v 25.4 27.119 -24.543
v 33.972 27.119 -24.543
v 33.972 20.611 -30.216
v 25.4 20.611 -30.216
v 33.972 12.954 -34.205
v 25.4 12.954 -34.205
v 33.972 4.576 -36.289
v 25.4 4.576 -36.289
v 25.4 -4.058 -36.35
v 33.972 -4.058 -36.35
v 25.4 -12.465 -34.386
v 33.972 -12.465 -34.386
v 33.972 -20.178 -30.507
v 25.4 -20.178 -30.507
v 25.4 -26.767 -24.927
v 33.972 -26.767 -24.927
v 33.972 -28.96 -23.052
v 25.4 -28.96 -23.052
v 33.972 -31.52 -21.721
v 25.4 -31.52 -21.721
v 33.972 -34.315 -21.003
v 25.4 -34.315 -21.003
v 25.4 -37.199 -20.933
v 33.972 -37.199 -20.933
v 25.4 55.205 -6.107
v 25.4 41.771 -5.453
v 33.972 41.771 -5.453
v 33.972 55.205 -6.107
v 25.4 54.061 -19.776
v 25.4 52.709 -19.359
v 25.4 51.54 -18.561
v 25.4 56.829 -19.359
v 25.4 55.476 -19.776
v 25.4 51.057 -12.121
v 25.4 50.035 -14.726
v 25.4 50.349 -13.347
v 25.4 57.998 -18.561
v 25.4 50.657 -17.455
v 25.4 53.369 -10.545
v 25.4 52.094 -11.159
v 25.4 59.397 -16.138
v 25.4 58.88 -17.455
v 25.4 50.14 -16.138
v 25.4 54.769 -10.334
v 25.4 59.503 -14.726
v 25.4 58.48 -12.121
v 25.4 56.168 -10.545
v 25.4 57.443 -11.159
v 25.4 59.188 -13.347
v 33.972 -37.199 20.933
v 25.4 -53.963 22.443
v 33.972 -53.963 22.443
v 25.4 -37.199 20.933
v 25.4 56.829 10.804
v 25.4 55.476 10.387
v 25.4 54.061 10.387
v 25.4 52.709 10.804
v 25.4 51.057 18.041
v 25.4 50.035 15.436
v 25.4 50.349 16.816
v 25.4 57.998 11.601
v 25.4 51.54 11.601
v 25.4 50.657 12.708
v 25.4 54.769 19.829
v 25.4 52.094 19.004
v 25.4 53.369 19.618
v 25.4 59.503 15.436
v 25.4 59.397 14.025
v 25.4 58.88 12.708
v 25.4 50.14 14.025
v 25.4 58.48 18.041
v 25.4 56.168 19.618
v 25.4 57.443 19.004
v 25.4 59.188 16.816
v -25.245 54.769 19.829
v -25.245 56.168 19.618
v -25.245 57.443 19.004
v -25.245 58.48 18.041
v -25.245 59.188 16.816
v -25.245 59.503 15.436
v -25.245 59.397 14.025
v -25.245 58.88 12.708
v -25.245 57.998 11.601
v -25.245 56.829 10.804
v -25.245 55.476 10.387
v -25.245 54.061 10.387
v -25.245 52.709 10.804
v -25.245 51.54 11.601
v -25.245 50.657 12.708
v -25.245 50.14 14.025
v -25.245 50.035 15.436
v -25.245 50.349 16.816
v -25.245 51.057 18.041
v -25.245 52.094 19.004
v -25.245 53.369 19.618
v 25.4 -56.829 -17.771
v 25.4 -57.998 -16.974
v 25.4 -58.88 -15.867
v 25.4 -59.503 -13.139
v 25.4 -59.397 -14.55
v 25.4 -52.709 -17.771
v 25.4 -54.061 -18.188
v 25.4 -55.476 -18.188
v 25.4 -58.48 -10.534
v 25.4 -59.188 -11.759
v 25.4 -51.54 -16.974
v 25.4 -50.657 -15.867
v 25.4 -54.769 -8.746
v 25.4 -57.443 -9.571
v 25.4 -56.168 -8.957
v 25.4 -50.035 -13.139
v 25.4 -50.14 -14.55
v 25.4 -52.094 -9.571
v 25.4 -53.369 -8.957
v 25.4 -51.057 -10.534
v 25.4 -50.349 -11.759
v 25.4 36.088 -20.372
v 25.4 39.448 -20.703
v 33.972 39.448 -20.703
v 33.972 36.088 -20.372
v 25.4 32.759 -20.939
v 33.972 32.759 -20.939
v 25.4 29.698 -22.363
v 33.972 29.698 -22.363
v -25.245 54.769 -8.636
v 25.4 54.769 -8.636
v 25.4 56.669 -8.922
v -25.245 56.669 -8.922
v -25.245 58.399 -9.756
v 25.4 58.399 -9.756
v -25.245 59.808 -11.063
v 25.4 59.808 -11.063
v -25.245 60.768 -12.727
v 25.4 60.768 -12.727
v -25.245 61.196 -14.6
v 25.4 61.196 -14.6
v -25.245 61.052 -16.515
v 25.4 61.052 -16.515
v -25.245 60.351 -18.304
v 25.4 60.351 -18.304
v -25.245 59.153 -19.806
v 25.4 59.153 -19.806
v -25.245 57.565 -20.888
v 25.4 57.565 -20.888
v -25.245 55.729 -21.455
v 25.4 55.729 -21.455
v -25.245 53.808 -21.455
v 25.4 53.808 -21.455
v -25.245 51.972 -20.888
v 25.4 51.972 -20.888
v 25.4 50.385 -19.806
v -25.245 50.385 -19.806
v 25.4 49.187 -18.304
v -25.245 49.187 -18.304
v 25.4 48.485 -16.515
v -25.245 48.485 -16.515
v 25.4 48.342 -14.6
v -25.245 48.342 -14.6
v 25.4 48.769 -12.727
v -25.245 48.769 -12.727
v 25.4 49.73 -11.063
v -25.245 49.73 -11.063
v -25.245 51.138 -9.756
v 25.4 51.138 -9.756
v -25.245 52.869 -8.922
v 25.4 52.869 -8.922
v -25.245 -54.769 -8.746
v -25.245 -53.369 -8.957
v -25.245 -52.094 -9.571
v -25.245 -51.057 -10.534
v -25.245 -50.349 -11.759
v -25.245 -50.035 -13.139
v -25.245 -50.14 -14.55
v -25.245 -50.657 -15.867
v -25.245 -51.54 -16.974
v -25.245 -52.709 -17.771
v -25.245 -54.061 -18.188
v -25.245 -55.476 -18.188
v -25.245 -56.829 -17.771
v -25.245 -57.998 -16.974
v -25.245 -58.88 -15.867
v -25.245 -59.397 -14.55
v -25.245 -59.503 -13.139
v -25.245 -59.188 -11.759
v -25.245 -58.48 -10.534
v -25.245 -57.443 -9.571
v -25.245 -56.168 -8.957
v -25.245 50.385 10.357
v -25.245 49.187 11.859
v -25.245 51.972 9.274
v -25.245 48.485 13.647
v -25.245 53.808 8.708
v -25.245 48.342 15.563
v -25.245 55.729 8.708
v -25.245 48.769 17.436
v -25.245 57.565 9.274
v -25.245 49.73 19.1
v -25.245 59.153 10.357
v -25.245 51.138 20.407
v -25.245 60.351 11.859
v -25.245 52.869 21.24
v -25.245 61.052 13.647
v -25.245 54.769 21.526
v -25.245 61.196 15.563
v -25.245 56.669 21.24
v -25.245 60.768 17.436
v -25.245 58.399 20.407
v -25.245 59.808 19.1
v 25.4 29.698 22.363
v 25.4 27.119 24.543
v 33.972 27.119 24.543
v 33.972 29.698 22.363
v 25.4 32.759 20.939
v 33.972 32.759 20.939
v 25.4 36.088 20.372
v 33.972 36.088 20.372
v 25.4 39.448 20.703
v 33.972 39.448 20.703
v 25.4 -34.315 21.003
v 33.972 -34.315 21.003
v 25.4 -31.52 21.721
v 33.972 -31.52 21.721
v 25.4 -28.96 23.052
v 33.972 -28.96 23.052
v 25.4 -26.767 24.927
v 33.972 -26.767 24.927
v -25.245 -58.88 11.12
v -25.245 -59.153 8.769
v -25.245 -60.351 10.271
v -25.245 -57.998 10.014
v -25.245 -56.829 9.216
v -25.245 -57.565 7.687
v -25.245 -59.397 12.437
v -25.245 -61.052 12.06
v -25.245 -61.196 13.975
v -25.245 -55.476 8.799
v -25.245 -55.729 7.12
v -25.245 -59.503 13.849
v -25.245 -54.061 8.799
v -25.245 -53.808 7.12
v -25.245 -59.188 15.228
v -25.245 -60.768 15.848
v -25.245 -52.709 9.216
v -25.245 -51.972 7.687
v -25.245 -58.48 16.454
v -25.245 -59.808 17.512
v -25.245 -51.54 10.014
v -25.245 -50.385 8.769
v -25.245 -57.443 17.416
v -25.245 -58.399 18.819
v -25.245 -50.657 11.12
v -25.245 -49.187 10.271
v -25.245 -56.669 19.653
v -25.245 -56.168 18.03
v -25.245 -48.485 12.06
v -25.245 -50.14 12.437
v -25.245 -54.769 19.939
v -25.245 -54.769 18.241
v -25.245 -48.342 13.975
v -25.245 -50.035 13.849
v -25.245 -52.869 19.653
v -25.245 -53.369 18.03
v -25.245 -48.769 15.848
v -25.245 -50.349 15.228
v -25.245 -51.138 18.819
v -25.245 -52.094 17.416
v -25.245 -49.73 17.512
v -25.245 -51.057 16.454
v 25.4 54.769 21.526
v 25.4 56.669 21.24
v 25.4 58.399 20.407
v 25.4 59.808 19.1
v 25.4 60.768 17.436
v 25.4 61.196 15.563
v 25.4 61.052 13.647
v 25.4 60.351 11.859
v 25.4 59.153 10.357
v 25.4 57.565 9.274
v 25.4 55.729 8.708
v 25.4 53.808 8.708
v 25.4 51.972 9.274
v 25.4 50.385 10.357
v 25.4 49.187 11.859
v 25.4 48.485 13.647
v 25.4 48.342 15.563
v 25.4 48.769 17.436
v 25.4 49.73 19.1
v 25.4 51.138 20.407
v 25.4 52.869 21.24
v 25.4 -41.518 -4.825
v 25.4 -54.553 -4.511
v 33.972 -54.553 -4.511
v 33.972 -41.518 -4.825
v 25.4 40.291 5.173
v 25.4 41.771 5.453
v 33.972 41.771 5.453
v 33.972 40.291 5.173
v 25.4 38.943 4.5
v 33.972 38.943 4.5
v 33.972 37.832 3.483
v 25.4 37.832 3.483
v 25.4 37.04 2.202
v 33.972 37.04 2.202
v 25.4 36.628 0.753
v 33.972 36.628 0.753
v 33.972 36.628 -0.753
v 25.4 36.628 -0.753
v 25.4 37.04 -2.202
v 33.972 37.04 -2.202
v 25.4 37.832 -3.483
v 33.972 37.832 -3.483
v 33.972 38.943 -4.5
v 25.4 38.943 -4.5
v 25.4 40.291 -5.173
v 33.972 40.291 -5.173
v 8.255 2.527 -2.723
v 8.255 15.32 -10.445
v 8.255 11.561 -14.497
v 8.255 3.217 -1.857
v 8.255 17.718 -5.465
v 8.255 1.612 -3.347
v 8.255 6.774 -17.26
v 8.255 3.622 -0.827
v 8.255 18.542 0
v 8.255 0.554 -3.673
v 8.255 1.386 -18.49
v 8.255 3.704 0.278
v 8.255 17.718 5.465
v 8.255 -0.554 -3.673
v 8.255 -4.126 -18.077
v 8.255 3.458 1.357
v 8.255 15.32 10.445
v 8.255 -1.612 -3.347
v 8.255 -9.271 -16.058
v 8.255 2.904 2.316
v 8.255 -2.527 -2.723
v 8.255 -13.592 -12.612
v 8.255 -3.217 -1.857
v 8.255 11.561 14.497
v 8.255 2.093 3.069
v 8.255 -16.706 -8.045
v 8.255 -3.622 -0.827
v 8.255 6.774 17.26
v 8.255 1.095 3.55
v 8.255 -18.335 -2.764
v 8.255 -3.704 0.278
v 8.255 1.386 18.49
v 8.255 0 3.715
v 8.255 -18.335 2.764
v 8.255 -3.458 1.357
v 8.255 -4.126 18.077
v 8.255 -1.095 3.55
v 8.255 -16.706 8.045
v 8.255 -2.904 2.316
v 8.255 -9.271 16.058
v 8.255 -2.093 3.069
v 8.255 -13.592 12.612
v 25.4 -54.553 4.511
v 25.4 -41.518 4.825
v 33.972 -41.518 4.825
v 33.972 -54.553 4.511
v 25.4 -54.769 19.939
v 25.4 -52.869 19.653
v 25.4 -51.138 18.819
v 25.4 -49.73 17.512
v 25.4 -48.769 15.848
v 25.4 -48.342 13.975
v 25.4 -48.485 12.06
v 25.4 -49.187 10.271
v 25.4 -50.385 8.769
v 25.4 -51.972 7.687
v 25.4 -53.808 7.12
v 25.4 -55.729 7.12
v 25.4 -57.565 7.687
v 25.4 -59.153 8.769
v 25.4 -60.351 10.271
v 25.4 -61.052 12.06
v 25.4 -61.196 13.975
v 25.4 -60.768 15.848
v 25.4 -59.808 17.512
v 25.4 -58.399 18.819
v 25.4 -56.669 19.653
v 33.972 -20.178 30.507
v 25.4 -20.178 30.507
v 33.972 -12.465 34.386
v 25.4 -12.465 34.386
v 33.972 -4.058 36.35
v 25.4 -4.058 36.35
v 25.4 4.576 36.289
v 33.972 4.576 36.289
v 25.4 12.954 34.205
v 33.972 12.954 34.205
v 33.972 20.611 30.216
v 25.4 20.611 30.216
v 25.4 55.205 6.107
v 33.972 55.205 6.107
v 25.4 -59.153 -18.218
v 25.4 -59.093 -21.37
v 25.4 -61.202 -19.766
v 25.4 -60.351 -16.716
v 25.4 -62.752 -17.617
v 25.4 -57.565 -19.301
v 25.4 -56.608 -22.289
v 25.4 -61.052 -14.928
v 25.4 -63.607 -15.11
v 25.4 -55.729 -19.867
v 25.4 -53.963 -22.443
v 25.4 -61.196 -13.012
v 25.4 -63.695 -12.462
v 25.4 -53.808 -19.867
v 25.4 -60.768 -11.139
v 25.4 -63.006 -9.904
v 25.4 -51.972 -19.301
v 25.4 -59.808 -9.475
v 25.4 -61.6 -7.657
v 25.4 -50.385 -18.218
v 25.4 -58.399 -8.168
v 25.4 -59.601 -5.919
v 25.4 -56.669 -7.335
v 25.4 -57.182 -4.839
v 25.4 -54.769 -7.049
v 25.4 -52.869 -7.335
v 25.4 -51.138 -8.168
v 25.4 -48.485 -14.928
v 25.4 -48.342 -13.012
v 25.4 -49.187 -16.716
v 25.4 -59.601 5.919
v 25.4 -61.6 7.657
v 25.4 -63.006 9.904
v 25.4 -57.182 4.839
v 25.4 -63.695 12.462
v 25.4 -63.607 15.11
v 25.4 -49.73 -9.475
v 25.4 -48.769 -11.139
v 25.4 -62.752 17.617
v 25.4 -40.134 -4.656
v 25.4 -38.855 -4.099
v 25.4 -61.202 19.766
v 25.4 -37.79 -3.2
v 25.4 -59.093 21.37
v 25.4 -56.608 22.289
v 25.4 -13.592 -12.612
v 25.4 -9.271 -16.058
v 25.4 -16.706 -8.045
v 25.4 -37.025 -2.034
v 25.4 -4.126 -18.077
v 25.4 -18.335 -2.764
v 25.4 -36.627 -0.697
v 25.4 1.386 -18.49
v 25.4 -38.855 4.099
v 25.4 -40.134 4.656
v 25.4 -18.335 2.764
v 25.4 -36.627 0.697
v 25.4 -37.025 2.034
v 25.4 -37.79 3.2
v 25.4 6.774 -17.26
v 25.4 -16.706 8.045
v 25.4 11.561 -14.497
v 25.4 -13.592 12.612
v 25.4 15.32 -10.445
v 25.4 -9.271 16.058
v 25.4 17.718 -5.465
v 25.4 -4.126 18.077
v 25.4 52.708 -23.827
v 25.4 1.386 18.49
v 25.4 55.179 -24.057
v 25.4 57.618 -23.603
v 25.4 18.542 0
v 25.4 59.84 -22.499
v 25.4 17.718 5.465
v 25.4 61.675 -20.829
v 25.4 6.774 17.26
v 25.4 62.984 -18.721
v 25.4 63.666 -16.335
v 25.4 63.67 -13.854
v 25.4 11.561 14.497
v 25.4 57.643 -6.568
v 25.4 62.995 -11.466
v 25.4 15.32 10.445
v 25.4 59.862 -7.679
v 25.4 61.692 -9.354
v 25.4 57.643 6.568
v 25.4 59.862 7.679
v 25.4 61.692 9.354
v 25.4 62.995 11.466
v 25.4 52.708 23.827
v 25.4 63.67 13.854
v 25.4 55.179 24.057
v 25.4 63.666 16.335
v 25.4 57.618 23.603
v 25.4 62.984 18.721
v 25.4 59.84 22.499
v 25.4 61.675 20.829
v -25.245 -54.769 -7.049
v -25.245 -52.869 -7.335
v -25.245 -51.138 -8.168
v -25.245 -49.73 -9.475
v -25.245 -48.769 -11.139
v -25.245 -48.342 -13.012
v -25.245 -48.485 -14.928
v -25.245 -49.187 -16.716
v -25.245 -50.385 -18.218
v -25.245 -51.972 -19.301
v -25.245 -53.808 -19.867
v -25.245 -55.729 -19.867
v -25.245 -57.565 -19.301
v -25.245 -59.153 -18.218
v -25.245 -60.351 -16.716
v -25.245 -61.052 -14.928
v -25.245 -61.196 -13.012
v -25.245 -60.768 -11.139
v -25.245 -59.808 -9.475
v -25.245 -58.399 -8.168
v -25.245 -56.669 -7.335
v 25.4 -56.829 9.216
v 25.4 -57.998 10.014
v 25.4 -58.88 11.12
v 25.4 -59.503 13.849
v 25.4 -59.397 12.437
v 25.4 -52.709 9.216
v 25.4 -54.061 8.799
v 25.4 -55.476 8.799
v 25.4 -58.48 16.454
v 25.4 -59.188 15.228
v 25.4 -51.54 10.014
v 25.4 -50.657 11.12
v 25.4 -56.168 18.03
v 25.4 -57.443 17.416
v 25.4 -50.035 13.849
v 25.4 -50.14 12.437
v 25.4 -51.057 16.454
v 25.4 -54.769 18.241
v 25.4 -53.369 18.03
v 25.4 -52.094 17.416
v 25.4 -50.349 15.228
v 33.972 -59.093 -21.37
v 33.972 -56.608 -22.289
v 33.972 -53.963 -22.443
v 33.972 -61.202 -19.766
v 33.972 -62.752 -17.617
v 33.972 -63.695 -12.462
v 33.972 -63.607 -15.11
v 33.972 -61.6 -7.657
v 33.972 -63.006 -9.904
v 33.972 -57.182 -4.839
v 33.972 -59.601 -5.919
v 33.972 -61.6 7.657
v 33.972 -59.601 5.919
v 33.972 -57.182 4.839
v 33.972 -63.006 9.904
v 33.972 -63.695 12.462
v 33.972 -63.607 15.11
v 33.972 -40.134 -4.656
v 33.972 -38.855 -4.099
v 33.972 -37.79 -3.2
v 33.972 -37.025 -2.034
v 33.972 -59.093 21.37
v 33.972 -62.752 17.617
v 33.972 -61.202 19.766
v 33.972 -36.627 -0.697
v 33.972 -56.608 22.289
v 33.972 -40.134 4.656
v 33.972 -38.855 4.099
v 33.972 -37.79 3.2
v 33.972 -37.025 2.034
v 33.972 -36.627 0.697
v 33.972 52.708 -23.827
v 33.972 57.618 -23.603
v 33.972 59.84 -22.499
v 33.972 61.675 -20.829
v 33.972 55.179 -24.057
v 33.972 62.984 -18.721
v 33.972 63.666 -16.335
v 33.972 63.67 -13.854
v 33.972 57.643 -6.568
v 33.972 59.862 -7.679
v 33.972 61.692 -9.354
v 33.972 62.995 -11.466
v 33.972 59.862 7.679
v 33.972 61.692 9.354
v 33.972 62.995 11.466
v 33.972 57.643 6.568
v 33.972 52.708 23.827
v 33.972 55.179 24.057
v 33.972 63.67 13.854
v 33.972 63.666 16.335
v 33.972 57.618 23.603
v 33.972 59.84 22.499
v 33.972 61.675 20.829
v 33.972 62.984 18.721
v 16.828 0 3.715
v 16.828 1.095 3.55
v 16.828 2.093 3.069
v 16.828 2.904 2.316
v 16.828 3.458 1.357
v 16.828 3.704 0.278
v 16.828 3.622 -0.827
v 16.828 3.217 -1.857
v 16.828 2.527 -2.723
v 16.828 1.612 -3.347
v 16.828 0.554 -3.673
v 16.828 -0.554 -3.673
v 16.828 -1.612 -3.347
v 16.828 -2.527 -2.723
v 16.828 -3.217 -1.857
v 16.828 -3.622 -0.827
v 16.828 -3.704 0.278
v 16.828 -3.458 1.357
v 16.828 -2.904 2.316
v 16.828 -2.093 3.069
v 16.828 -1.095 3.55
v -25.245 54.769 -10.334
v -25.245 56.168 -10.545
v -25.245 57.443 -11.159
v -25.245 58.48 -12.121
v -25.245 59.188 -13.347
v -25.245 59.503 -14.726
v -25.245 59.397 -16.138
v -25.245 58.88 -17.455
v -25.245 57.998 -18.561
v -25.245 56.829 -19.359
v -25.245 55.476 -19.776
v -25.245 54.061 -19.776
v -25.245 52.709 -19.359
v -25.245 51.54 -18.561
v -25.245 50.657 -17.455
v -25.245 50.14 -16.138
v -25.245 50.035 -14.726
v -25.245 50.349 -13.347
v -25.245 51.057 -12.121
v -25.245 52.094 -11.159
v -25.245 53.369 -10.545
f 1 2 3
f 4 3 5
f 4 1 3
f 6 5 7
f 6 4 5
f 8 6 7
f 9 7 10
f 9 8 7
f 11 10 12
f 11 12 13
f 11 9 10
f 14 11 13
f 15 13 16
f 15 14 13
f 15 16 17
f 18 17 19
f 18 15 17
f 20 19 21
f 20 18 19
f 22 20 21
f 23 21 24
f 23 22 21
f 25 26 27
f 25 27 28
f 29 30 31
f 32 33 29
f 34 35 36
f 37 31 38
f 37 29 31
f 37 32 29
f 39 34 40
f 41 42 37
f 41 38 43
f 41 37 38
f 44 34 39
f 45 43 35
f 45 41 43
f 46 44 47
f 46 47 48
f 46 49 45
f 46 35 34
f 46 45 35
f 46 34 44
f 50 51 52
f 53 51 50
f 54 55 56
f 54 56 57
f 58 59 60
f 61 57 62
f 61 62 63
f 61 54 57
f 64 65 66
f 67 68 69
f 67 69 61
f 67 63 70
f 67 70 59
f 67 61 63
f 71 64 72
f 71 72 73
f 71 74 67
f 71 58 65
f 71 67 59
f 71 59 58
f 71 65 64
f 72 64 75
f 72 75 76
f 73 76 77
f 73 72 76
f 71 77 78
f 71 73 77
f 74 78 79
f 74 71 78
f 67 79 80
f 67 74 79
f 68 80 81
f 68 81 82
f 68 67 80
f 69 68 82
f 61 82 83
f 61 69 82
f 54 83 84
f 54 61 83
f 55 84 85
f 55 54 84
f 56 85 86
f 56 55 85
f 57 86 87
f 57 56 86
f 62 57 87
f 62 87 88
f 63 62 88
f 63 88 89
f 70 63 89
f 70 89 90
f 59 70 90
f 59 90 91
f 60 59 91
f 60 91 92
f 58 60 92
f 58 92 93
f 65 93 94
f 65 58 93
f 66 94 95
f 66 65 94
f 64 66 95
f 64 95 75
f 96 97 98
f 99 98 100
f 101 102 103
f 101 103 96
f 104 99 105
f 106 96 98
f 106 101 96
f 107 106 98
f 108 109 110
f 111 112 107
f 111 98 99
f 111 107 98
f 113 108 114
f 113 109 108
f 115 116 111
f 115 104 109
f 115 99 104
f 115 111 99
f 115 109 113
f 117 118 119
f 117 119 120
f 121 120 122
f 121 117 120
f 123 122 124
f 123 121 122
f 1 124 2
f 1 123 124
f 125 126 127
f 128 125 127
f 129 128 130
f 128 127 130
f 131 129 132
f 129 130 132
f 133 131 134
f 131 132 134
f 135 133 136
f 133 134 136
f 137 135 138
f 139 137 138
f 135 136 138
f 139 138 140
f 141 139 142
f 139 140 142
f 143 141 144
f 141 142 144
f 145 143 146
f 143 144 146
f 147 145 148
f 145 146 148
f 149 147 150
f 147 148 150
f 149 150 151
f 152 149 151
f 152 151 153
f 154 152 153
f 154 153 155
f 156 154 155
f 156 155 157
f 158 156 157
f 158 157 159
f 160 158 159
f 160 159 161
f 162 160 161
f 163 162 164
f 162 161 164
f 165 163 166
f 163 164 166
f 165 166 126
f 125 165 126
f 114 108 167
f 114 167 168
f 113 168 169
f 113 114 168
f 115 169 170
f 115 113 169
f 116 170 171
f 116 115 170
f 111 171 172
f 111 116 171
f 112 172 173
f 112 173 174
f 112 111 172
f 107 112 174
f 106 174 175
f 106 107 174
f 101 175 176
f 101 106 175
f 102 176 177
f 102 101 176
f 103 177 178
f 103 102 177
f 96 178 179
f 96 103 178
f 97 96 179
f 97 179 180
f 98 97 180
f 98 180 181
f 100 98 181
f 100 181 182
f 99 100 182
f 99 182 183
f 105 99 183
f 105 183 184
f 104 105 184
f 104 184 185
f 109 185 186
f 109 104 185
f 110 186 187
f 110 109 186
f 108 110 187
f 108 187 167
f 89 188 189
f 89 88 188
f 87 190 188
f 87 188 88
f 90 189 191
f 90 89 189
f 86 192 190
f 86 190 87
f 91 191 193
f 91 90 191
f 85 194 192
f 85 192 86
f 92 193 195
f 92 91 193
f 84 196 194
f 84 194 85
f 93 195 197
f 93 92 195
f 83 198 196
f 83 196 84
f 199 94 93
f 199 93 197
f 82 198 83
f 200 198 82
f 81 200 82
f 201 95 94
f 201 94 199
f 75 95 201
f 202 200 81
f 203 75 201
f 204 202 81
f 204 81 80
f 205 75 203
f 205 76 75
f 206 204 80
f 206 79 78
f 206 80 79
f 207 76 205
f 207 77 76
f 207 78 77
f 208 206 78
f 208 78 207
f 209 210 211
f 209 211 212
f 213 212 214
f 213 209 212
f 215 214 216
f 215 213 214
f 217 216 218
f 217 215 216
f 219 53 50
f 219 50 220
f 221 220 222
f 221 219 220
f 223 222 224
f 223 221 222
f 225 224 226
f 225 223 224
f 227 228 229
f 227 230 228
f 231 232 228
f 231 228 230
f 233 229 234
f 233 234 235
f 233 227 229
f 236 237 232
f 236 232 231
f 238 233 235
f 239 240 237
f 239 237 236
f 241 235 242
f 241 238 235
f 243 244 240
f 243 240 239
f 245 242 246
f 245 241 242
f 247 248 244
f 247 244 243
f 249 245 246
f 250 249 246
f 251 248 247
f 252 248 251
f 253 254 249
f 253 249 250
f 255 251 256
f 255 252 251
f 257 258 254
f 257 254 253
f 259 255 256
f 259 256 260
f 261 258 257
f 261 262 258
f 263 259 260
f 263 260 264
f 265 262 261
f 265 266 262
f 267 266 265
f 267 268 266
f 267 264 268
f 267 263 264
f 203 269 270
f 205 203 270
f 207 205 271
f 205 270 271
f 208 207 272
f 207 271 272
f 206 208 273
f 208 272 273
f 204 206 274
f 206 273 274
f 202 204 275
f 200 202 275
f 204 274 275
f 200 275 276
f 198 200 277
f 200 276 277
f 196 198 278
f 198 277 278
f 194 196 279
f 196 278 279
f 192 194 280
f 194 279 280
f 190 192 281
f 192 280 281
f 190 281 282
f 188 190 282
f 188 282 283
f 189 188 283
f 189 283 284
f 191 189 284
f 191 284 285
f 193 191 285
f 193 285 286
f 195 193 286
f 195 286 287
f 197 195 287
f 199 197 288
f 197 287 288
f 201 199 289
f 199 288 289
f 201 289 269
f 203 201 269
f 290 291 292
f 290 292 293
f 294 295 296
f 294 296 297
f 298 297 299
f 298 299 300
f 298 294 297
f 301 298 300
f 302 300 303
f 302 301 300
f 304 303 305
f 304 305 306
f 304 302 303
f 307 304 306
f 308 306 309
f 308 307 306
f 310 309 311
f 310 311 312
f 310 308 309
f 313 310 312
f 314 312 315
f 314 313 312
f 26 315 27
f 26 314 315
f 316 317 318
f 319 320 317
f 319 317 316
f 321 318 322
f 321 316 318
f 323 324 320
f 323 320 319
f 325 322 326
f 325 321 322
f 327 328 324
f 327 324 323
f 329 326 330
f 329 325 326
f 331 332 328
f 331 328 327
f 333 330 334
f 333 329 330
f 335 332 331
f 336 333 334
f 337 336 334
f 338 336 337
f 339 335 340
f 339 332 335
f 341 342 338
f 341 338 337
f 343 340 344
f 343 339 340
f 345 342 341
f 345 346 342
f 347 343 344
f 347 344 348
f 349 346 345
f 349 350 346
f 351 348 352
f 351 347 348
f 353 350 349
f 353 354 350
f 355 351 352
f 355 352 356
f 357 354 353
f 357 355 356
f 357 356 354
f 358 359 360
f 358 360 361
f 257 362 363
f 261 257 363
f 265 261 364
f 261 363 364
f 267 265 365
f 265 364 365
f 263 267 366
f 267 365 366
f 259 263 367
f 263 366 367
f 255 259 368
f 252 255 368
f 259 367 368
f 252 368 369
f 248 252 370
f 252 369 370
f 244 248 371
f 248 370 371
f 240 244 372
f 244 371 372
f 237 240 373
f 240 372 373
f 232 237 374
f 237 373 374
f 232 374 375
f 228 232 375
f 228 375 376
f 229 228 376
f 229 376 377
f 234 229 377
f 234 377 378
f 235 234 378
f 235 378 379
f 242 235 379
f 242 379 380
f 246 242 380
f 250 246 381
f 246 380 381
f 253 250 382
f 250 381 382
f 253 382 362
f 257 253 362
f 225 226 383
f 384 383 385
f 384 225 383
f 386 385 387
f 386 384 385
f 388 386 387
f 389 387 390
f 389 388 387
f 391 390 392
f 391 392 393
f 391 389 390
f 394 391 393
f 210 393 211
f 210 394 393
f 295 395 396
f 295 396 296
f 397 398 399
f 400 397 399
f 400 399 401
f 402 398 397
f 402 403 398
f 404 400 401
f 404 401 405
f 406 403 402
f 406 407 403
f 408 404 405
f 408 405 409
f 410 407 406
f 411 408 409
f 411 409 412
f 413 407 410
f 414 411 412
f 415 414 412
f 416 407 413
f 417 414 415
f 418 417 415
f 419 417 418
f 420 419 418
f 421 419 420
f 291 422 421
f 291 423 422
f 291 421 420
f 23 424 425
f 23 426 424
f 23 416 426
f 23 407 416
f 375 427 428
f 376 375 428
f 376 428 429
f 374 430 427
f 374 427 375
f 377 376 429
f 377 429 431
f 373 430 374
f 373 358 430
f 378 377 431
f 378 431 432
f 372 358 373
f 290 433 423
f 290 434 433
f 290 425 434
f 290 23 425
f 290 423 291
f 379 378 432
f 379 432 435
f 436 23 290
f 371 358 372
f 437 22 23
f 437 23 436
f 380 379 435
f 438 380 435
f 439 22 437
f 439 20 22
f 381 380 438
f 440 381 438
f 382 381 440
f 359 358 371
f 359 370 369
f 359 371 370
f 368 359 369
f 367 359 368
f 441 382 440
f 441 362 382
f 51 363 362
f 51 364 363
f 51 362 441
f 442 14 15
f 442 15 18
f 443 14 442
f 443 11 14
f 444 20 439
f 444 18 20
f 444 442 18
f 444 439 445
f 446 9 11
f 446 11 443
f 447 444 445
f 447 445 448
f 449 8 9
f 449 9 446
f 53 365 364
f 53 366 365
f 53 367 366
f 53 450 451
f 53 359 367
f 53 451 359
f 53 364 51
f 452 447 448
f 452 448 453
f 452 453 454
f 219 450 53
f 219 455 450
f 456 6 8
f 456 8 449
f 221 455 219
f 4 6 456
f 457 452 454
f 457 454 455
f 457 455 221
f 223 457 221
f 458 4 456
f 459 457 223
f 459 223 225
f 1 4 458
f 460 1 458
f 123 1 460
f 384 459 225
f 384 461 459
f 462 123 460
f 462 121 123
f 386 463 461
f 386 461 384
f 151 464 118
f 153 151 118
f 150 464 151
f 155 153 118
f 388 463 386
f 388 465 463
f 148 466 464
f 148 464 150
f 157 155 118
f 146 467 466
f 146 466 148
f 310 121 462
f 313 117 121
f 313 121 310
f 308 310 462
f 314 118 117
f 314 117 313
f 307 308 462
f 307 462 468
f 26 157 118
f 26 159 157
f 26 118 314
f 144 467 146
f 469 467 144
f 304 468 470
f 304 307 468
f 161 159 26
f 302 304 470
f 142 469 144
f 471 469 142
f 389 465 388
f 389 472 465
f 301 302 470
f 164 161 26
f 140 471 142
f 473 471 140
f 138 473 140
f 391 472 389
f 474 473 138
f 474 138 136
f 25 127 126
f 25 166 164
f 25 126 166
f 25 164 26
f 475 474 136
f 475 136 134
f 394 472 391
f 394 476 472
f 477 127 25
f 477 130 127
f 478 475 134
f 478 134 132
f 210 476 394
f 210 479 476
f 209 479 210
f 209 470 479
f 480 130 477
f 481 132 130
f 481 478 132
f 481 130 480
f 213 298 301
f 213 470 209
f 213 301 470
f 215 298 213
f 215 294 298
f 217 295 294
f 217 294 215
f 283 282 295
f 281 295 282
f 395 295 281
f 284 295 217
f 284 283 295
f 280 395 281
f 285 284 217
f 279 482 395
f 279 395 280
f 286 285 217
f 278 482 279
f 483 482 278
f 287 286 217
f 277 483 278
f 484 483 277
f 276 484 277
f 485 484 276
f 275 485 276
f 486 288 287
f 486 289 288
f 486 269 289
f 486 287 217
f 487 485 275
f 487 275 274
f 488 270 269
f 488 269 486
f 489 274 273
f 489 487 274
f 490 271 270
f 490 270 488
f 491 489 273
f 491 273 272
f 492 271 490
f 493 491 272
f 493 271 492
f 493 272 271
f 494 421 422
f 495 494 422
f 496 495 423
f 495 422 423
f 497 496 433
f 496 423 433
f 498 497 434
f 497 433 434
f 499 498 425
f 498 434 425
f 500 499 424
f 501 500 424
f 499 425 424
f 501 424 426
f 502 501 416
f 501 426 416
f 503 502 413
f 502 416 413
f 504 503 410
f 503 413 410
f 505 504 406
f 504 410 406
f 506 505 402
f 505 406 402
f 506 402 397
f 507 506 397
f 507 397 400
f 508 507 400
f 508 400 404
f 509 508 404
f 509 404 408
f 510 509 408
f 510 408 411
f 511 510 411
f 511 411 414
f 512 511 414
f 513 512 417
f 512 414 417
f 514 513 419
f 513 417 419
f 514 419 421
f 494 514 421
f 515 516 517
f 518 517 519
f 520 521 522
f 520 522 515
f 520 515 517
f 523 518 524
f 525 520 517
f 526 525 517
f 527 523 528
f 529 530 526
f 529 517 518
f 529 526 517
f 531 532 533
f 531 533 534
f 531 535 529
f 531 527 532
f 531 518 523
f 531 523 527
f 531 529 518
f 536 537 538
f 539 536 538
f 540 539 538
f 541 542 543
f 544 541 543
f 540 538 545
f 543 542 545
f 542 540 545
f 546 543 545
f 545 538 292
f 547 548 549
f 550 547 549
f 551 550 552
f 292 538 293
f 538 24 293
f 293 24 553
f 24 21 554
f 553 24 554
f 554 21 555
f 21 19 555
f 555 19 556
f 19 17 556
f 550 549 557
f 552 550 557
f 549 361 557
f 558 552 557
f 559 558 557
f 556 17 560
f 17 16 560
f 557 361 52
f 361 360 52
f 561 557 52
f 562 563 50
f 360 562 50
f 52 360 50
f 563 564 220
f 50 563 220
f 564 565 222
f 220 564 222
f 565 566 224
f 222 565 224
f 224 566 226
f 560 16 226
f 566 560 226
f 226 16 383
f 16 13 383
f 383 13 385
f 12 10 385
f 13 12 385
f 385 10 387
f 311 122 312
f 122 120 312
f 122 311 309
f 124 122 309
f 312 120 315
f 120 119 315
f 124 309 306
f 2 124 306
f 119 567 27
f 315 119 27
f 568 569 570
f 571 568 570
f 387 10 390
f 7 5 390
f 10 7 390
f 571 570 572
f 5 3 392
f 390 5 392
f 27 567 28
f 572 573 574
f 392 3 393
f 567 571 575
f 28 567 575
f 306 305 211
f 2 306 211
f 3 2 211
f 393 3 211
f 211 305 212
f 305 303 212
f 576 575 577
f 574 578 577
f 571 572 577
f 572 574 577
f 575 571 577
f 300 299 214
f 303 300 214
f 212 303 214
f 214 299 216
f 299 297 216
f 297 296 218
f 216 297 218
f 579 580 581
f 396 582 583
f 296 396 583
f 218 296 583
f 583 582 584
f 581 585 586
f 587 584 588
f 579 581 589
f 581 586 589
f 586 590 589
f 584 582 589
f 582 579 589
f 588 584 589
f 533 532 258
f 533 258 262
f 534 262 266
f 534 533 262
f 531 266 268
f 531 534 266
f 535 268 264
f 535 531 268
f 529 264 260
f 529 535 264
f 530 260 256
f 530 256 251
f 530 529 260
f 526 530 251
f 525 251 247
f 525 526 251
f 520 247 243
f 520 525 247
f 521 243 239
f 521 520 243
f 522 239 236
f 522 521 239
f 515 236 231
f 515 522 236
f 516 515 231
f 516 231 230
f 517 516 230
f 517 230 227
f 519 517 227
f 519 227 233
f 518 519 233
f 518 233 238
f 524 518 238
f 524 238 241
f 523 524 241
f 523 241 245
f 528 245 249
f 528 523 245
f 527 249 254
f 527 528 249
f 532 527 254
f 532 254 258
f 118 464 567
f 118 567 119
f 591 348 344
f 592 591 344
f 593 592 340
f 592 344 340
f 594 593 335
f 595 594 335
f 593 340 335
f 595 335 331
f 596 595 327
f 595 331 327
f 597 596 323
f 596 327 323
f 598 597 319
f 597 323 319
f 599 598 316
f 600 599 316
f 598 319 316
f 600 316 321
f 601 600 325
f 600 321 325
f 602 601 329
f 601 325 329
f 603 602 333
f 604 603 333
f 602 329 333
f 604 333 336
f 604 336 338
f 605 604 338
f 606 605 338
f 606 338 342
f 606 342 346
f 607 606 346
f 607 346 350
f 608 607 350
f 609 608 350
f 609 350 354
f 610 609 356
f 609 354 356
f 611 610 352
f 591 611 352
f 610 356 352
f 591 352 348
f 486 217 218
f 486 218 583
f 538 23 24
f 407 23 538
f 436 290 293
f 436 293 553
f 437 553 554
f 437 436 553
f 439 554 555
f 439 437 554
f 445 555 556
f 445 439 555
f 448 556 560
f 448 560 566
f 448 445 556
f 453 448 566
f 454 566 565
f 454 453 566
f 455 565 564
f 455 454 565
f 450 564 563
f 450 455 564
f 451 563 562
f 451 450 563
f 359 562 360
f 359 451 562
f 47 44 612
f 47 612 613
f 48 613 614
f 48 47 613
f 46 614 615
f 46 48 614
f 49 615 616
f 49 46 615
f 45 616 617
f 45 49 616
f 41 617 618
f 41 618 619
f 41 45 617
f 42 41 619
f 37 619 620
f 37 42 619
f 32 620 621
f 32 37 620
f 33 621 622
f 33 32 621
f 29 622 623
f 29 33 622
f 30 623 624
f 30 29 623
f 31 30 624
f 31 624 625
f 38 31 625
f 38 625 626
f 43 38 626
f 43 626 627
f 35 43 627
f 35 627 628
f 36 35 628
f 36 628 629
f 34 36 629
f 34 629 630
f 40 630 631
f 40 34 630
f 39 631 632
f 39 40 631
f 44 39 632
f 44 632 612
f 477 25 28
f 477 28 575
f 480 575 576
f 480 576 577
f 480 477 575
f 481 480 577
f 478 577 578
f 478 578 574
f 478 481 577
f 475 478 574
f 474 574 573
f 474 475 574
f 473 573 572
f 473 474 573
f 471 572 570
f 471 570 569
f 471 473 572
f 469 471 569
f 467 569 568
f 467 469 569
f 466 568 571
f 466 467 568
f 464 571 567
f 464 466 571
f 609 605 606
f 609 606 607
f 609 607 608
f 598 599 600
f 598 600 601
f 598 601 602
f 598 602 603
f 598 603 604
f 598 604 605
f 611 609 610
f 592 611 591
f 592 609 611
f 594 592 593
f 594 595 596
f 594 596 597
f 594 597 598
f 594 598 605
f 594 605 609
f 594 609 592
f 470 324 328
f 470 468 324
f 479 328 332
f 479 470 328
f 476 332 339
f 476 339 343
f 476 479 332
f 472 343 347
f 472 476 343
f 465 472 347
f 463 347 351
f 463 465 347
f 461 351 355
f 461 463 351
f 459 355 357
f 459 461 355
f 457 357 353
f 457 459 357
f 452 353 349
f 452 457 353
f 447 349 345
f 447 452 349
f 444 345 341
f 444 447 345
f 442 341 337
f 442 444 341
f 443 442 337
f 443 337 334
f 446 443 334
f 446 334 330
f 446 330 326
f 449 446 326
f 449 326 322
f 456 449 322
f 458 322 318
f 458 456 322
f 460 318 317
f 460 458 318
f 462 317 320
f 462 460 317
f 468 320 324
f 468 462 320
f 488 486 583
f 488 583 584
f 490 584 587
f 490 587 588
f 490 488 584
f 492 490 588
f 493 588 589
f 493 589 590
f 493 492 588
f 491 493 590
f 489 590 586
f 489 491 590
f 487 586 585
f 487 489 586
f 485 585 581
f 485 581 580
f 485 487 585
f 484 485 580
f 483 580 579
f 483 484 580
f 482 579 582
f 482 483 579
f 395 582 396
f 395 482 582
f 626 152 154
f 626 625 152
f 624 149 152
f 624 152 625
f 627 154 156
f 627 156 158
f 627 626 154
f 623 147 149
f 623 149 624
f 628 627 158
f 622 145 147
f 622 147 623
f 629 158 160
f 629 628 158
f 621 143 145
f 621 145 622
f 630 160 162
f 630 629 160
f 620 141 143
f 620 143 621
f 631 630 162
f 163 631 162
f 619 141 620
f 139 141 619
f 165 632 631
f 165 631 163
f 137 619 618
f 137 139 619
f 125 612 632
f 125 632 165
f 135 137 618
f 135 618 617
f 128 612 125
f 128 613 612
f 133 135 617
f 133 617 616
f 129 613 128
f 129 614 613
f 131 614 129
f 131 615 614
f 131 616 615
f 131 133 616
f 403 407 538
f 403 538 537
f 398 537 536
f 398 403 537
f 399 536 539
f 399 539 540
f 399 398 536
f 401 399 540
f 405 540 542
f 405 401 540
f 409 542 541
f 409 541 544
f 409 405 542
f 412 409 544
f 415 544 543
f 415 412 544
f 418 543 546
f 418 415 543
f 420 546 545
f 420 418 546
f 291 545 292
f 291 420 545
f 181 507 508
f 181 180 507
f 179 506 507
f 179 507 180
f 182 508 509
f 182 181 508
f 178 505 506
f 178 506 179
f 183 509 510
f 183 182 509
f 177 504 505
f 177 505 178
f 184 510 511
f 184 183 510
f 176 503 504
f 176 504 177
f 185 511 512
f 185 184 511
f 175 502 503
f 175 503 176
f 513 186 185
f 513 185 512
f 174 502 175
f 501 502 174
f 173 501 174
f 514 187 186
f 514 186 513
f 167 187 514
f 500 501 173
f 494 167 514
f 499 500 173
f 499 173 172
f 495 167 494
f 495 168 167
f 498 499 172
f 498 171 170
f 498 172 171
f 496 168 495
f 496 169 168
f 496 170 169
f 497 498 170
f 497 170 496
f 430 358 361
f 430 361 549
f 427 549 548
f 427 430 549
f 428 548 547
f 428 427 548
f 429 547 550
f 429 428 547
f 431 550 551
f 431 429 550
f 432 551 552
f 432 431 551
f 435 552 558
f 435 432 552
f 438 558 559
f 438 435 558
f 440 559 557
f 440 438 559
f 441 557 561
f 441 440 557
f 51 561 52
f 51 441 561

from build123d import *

# Parameters (mm, degrees)
SKETCH1_W           = 17.145
SKETCH1_H           = 18.542
SKETCH2_R           = 3.71475
CUT_EXTRUDE1_DEPTH  = 8.5725
BOSS_EXTRUDE1_DEPTH = 8.5725
SKETCH4_R           = 6.44525
SKETCH4_R_2         = 4.7474251
BOSS_EXTRUDE2_DEPTH = 50.645121951


with BuildPart() as part:
    # Sketch1 → Revolve1 (revolve)
    with BuildSketch(Plane.XY):
        with Locations((16.8275, 9.271)):
            Rectangle(SKETCH1_W, SKETCH1_H)
    revolve(axis=Axis((8.255, 0, 0), (1, 0, 0)))

    # Sketch2 → Cut-Extrude1 (cut)
    with BuildSketch(Plane.ZY.offset(-8.255)):
        Circle(SKETCH2_R)
    extrude(amount=-CUT_EXTRUDE1_DEPTH, mode=Mode.SUBTRACT)

    # Sketch3 → Boss-Extrude1 (add)
    with BuildSketch(Plane(origin=(25.4, 0, 0), x_dir=(0, 0, -1), z_dir=(1, 0, 0))):
        with BuildLine():
            Line((-20.702899344, 39.448323668), (-23.827032985, 52.708168154))
            ThreePointArc((-23.827032985, 52.708168154), (-16.334994998, 63.666100226), (-6.106605949, 55.205192121))
            Line((-6.106605949, 55.205192121), (-5.453270033, 41.770518865))
            ThreePointArc((-5.453270033, 41.770518865), (0, 36.576), (5.453270033, 41.770518865))
            Line((5.453270033, 41.770518865), (6.106605949, 55.205192121))
            ThreePointArc((6.106605949, 55.205192121), (16.334994998, 63.666100226), (23.827032985, 52.708168154))
            Line((23.827032985, 52.708168154), (20.702899344, 39.448323668))
            ThreePointArc((20.702899344, 39.448323668), (20.938893682, 32.759417922), (24.542669739, 27.119386757))
            ThreePointArc((24.542669739, 27.119386757), (36.575069792, 0.260855666), (24.926987696, -26.766566093))
            ThreePointArc((24.926987696, -26.766566093), (21.721471464, -31.520323876), (20.93336456, -37.199446597))
            Line((20.93336456, -37.199446597), (22.442795242, -53.962954235))
            ThreePointArc((22.442795242, -53.962954235), (13.789101844, -63.749144471), (4.511097805, -54.552701147))
            Line((4.511097805, -54.552701147), (4.824604712, -41.518040373))
            ThreePointArc((4.824604712, -41.518040373), (0, -36.576), (-4.824604712, -41.518040373))
            Line((-4.824604712, -41.518040373), (-4.511097805, -54.552701147))
            ThreePointArc((-4.511097805, -54.552701147), (-13.789101844, -63.749144471), (-22.442795242, -53.962954235))
            Line((-22.442795242, -53.962954235), (-20.93336456, -37.199446597))
            ThreePointArc((-20.93336456, -37.199446597), (-21.721471464, -31.520323876), (-24.926987696, -26.766566093))
            ThreePointArc((-24.926987696, -26.766566093), (-36.575069792, 0.260855666), (-24.542669739, 27.119386757))
            ThreePointArc((-24.542669739, 27.119386757), (-20.938893682, 32.759417922), (-20.702899344, 39.448323668))
        make_face()
    extrude(amount=BOSS_EXTRUDE1_DEPTH)

    # Sketch4 → Boss-Extrude2 (add)
    with BuildSketch(Plane.ZY.offset(-25.4)):
        with Locations((-15.08125, 54.76875)):
            Circle(SKETCH4_R)
        with Locations((-15.08125, 54.76875)):
            Circle(SKETCH4_R_2, mode=Mode.SUBTRACT)
        with Locations((15.08125, 54.76875)):
            Circle(SKETCH4_R)
        with Locations((15.08125, 54.76875)):
            Circle(SKETCH4_R_2, mode=Mode.SUBTRACT)
        with Locations((13.49375, -54.76875)):
            Circle(SKETCH4_R)
        with Locations((13.49375, -54.76875)):
            Circle(SKETCH4_R_2, mode=Mode.SUBTRACT)
        with Locations((-13.49375, -54.76875)):
            Circle(SKETCH4_R)
        with Locations((-13.49375, -54.76875)):
            Circle(SKETCH4_R_2, mode=Mode.SUBTRACT)
    extrude(amount=BOSS_EXTRUDE2_DEPTH)


solid = part.part
